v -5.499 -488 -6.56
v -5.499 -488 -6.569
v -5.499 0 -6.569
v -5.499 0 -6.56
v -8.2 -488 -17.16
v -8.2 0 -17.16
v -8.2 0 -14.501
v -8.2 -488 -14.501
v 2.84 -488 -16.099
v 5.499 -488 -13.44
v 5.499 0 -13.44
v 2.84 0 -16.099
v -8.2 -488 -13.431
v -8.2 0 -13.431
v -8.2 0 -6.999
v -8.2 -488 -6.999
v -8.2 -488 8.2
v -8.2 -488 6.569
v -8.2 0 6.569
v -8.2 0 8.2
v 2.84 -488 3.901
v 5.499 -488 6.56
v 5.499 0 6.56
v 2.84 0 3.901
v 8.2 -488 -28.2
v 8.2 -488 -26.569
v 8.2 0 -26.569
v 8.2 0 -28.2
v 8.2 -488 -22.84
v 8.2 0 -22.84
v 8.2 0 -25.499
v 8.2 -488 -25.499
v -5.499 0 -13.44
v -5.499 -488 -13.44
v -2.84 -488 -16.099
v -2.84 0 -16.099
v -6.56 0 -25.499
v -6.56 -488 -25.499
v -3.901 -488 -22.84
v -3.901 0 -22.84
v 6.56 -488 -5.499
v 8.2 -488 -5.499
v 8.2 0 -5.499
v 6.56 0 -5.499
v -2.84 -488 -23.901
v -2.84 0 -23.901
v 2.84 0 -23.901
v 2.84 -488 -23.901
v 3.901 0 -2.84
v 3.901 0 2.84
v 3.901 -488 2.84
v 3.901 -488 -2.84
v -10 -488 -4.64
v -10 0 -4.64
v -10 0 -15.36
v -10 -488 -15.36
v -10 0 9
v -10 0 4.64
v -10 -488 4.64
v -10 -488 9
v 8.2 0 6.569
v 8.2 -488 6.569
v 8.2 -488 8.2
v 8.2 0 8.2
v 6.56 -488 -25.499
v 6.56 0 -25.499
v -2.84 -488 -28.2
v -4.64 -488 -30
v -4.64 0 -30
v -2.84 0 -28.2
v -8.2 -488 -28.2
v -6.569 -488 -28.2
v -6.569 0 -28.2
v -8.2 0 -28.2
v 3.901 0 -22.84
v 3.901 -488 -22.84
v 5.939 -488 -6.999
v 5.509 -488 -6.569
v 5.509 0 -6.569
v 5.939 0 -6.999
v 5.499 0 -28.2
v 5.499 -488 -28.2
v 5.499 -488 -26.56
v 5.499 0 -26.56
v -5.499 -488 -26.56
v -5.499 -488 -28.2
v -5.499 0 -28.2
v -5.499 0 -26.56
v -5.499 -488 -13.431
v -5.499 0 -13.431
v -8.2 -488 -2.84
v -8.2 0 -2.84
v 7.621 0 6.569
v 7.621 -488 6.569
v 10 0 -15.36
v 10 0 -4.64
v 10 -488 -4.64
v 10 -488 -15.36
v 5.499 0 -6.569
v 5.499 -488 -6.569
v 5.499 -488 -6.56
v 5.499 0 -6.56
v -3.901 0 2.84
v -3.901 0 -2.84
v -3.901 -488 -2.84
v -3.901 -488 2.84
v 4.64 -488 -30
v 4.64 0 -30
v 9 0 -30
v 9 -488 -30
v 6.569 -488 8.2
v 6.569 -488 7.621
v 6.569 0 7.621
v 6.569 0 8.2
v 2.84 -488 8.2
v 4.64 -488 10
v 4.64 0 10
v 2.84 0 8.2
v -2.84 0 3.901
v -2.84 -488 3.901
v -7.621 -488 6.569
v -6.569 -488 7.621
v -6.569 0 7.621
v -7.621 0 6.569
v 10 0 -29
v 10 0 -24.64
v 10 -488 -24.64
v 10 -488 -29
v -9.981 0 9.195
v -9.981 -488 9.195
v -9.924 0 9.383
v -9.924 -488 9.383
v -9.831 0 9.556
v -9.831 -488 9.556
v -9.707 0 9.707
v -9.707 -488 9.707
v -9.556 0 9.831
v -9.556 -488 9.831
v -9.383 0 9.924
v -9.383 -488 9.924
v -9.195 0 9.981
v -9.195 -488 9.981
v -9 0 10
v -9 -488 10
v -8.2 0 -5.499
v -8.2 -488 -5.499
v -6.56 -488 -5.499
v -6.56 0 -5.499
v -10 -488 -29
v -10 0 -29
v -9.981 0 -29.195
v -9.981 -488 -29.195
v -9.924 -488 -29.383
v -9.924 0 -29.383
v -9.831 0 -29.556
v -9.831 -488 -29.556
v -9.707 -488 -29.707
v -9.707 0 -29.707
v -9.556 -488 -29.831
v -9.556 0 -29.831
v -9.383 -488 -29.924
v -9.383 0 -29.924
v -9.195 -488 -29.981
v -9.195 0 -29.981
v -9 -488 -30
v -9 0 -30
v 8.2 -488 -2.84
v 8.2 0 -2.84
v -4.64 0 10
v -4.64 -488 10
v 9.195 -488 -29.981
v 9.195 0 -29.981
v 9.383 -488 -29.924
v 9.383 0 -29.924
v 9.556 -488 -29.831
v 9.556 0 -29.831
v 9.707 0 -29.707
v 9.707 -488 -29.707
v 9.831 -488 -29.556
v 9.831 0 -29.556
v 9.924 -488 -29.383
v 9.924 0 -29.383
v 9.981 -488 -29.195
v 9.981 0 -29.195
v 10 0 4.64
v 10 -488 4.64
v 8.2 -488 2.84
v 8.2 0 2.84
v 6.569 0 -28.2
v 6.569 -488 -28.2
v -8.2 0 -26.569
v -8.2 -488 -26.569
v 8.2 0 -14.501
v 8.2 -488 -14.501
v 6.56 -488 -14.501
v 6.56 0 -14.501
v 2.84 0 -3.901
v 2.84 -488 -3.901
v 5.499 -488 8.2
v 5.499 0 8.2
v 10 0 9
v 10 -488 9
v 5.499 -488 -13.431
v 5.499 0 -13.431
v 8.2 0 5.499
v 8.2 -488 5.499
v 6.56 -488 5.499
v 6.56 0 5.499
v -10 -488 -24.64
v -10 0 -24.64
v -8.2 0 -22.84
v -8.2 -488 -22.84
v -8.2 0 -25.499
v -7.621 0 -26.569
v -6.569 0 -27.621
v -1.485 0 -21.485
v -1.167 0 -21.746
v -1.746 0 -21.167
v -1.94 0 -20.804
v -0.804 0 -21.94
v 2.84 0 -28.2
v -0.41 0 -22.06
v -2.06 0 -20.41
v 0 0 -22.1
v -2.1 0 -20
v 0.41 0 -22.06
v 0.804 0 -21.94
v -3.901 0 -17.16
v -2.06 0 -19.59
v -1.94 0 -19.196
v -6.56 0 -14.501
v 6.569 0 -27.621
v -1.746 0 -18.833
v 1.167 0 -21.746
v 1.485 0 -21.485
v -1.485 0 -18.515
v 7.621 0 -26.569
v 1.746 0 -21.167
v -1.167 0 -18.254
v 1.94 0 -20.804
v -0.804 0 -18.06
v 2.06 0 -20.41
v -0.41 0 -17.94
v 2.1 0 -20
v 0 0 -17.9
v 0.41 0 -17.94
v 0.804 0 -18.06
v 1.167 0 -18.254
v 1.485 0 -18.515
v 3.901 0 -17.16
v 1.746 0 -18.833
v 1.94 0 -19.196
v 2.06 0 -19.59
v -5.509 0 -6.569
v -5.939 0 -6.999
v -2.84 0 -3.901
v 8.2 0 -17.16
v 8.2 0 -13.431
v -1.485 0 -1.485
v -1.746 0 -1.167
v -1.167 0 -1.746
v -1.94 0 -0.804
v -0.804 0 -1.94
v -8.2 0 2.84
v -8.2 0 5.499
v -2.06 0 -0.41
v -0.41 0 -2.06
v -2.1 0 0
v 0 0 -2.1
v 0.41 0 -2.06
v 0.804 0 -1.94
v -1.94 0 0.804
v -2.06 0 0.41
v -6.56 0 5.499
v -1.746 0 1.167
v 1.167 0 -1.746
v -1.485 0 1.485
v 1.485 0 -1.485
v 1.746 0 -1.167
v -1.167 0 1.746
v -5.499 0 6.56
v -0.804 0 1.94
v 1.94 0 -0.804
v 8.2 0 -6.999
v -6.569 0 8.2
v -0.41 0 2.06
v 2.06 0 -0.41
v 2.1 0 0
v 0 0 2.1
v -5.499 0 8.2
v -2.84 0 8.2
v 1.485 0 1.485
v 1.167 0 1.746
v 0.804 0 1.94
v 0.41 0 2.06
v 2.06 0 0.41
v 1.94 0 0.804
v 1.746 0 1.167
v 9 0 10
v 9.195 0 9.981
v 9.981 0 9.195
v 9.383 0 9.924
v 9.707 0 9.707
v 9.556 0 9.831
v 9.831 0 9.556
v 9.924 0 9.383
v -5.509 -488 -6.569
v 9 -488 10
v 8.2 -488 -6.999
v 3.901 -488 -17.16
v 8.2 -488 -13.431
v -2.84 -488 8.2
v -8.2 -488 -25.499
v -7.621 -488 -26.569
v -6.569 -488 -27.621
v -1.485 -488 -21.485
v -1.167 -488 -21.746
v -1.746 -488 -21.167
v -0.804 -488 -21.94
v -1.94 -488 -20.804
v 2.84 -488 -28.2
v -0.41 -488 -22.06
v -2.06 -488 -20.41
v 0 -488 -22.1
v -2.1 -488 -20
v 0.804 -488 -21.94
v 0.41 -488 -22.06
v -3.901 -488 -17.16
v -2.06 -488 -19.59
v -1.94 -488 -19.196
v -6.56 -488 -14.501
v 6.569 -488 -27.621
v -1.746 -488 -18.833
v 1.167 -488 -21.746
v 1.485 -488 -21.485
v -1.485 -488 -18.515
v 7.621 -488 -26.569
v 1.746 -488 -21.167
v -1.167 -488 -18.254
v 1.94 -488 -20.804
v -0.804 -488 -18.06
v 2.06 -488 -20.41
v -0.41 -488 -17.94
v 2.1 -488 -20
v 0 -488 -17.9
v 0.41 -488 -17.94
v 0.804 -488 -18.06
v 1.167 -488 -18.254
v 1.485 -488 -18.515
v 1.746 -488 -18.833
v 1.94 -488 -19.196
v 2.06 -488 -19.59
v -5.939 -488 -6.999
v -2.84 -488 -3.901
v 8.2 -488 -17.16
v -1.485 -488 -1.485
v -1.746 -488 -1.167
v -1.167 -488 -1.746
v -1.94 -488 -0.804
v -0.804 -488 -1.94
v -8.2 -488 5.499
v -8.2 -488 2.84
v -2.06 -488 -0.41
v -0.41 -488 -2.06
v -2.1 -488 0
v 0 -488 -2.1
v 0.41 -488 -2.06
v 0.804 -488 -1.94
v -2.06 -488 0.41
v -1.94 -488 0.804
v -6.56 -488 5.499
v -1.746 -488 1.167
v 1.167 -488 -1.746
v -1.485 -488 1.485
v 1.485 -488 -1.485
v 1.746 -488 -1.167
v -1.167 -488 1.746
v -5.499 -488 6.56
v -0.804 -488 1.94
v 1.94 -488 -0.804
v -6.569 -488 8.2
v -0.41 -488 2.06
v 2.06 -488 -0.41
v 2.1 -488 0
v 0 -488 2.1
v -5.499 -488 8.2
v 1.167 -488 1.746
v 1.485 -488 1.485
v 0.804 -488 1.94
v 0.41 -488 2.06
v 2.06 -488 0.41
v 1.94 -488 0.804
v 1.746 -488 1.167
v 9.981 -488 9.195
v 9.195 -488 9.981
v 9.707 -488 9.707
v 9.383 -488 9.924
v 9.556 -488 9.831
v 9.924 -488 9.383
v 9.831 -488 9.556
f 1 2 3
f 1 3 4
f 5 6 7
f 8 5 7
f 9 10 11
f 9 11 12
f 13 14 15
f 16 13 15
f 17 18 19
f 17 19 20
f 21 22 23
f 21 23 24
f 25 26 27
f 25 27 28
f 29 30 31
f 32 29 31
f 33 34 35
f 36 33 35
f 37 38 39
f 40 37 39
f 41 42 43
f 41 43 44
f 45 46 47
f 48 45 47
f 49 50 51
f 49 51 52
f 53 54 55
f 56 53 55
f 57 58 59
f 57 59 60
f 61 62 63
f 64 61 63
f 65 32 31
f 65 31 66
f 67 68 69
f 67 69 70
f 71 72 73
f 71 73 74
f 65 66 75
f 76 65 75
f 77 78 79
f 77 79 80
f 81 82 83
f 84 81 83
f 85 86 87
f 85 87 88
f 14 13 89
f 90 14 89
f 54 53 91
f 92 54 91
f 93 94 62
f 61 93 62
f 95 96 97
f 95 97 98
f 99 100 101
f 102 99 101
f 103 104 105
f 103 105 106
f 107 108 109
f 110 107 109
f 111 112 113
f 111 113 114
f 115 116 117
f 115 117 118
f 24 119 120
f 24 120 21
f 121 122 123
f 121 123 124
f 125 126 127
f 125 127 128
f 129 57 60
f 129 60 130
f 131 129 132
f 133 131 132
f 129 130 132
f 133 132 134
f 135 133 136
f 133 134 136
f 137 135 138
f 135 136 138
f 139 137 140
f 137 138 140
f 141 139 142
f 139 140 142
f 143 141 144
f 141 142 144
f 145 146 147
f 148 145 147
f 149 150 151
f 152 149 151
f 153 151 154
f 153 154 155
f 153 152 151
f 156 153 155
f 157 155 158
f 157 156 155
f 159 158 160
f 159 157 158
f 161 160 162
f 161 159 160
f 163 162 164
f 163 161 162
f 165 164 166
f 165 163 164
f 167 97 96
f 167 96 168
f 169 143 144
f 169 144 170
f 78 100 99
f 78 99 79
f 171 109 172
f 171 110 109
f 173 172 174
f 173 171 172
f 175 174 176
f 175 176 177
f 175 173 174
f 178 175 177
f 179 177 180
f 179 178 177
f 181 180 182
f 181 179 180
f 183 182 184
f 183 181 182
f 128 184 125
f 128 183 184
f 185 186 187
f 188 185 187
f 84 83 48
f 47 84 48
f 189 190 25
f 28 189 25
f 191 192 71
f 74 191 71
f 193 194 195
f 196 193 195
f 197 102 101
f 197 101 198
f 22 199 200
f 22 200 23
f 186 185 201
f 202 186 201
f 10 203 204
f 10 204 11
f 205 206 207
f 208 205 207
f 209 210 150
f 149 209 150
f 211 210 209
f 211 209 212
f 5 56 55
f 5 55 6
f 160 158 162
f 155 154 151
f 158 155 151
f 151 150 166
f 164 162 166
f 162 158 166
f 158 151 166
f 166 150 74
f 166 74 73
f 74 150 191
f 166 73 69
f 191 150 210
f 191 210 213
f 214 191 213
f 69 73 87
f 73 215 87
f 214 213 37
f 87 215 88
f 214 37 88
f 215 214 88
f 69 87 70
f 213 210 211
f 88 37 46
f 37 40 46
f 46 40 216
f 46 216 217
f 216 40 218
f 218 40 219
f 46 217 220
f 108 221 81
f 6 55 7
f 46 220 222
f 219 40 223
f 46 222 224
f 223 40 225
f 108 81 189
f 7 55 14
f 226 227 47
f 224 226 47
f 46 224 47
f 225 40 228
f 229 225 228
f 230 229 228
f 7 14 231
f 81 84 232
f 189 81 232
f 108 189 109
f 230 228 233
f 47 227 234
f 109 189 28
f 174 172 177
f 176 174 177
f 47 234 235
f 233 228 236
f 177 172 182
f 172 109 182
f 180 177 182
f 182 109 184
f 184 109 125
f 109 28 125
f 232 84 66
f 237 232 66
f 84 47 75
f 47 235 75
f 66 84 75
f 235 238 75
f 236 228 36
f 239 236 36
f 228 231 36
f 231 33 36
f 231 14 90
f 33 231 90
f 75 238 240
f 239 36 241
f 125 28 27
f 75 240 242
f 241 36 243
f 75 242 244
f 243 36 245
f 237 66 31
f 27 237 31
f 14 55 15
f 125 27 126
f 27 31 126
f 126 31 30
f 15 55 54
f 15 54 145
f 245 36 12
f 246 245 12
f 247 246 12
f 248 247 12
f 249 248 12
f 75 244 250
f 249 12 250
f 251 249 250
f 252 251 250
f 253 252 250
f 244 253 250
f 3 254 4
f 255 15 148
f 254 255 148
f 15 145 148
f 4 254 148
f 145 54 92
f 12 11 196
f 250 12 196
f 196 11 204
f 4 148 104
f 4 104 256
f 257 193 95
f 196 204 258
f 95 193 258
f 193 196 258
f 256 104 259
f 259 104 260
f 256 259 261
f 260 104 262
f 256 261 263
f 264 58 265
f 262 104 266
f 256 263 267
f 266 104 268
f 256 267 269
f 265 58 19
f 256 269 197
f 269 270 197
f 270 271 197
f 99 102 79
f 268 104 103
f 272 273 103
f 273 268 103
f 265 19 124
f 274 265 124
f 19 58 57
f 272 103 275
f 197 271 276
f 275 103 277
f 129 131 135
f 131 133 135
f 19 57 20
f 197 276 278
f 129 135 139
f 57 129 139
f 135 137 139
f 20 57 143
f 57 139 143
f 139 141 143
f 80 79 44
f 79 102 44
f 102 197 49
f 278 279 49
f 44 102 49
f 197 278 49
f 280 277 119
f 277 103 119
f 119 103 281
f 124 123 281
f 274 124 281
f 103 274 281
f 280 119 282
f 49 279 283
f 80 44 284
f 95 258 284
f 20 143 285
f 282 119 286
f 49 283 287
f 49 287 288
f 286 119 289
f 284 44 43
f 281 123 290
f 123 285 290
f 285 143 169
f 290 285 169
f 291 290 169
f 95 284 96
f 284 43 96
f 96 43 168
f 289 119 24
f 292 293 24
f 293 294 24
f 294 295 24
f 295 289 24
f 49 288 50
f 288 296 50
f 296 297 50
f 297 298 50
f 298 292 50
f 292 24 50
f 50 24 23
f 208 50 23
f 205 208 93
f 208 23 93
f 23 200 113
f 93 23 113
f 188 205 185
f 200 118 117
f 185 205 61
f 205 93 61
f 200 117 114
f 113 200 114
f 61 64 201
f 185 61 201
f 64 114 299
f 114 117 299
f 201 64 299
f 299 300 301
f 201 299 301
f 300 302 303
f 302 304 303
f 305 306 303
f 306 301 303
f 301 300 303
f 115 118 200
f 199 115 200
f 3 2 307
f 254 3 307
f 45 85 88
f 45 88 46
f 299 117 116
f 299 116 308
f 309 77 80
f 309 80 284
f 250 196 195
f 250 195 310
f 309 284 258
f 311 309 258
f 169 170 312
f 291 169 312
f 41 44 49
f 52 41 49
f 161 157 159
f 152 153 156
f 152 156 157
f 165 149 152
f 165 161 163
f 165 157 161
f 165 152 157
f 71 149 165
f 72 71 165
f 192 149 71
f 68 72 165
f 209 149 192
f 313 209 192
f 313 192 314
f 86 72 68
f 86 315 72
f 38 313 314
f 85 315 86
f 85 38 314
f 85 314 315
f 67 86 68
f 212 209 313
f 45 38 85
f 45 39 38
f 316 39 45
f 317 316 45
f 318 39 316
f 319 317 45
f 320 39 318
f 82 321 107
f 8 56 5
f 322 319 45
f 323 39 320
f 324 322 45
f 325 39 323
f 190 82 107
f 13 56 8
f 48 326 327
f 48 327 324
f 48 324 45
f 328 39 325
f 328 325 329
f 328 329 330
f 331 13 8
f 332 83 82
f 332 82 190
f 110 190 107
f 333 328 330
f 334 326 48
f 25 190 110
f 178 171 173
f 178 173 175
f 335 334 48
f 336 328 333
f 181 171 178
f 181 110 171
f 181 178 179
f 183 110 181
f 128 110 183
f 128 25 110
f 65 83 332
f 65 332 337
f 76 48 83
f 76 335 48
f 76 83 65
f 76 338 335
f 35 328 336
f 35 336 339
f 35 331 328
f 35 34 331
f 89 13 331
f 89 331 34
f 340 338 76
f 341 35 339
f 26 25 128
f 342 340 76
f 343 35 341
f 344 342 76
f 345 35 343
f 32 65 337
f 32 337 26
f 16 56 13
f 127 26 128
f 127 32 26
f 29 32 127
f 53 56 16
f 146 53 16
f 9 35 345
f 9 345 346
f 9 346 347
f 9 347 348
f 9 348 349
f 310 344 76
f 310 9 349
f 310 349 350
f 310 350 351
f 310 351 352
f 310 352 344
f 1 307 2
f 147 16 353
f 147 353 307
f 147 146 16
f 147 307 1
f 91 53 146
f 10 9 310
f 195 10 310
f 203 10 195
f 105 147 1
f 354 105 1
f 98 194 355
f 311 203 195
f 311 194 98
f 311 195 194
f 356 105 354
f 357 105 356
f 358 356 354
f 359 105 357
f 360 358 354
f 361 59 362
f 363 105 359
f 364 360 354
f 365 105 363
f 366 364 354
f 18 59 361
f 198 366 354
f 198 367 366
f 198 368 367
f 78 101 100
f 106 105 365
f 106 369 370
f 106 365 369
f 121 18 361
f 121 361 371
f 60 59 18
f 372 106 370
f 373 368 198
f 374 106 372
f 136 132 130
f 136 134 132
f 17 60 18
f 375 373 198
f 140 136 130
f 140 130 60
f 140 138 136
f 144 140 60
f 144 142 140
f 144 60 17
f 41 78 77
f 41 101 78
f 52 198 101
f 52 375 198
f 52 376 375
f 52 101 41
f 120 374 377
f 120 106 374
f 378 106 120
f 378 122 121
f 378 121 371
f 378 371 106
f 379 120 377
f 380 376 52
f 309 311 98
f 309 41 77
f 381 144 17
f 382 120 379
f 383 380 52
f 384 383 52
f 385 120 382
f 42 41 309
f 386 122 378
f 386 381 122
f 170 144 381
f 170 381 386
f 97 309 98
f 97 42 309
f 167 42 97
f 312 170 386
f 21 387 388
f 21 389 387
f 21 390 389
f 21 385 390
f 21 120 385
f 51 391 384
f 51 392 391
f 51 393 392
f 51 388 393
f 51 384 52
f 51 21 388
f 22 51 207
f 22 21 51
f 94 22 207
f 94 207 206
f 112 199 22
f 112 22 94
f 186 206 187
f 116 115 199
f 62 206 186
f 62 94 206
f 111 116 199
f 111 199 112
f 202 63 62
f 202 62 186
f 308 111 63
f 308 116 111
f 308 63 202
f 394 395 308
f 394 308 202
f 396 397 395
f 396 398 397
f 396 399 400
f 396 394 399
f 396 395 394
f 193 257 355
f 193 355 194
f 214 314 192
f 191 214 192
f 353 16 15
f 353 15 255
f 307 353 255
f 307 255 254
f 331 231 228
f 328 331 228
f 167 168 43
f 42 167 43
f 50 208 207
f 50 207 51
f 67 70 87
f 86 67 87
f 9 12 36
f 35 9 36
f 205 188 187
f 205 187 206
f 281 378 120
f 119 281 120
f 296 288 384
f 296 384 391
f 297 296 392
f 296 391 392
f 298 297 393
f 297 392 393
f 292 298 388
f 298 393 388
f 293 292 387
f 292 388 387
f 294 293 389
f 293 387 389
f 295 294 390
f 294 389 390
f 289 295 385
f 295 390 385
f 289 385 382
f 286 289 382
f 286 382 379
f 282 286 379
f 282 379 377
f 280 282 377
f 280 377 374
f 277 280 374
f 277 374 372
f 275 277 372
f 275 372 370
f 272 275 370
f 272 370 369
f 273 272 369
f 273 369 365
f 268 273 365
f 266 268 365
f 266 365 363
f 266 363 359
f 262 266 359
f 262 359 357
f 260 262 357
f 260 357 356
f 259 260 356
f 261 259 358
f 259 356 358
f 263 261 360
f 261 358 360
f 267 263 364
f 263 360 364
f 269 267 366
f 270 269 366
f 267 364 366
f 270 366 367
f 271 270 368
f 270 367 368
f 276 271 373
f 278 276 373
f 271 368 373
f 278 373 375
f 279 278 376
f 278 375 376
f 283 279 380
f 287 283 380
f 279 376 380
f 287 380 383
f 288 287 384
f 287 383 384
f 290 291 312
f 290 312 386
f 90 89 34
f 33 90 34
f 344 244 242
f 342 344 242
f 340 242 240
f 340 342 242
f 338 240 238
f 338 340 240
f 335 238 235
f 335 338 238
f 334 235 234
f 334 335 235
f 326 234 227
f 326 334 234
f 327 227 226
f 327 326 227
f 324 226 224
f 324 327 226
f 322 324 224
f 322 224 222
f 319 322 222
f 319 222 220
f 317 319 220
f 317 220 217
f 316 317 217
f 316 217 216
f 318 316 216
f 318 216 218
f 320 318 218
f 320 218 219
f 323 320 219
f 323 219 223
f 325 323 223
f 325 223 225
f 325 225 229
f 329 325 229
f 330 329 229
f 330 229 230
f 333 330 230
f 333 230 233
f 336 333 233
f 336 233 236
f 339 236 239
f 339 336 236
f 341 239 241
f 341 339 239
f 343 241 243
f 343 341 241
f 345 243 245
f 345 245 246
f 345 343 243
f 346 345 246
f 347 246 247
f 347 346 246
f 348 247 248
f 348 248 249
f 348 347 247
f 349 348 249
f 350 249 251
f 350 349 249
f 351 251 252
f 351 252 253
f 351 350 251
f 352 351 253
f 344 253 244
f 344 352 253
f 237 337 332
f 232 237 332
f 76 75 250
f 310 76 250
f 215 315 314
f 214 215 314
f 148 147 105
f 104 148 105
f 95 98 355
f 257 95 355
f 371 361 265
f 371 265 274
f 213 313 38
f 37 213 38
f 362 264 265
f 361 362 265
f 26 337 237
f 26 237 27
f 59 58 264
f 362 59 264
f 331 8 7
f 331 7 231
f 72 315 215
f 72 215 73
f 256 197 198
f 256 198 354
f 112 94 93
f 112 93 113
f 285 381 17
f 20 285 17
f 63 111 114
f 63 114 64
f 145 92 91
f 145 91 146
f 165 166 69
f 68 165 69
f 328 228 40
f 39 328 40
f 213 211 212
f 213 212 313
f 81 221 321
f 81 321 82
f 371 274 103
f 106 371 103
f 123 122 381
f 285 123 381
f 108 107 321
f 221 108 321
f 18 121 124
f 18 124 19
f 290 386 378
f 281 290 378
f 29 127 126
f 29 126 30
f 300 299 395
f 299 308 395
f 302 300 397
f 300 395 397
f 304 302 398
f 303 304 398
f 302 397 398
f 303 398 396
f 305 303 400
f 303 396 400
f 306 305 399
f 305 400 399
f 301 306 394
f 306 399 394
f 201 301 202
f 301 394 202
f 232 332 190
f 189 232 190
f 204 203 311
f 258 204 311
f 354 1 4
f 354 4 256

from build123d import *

# Parameters (mm, degrees)
F0_W             = 20
F0_H             = 20
F1_DEPTH         = 488
F2_R             = 2.1
F3_DEPTH         = 488.001
F4_R             = 1
F6_DEPTH         = 488.001
F6_COPIES3_COUNT = 2
F6_COPIES3_ANGLE = 90
F6_COPIES4_COUNT = 2
F6_COPIES4_ANGLE = 270
F6_COPIES6_COUNT = 2
F9_W             = 16.4
F9_H             = 6.8613203436
F10_DEPTH        = 488.001
F12_DEPTH        = 488


# Not quite as in the source:
# - a pattern or mirror of a feature is missing from the dataset's text; its kind, count and spacing are read off the source's solid


with BuildPart() as f1:
    # F0 (on Front) → F1 (new body)
    with BuildSketch(Plane.XZ):
        Rectangle(F0_W, F0_H)
    extrude(amount=F1_DEPTH)

    # F2 (on face) → F3 (cut, through all)
    with BuildSketch(Plane.XZ.offset(488)):
        Circle(F2_R)
    extrude(amount=-F3_DEPTH, mode=Mode.SUBTRACT)

    # F4
    f4_edges = [f1.edges().sort_by_distance(p)[0] for p in [
        (-10, -244, 10),
        (10, -244, 10),
    ]]
    fillet(f4_edges, radius=F4_R)

    # F5 (on face) → F6 (cut, through all)
    with BuildSketch(Plane.XZ.offset(488)):
        Polygon((0, 3.9006601718), (0, 10), (-2.84, 10), (-4.64, 10), (-2.84, 8.2), (-5.4993398282, 8.2), (-5.4993398282, 6.56), (-2.84, 3.9006601718), align=None)
        Polygon((-6.5693398282, 8.2), (-8.2, 8.2), (-7.0953059148, 7.0953059148), (-6.5693398282, 7.6212720014), align=None)
    f6 = extrude(amount=-F6_DEPTH, mode=Mode.SUBTRACT)

    # F6_copies: F6 across plane
    add(f6.mirror(Plane(origin=(0, 0, 0), x_dir=(-0.7071067812, 0, -0.7071067812), z_dir=(0.7071067812, 0, -0.7071067812))), mode=Mode.SUBTRACT)

    # F6_copies1: F6 across plane
    add(f6.mirror(Plane(origin=(0, 0, 0), x_dir=(0.7071067812, 0, -0.7071067812), z_dir=(-0.7071067812, 0, -0.7071067812))), mode=Mode.SUBTRACT)

    # F6_copies2: F6 across plane
    add(f6.mirror(Plane(origin=(0, 0, 0), x_dir=(0, 0, 1), z_dir=(1, 0, 0))), mode=Mode.SUBTRACT)

    # F6_copies3: F6 ×2 about axis
    f6_copies3_axis = Axis((0, 0, 0), (0, 1, 0))
    for i in range(1, F6_COPIES3_COUNT):
        add(f6.rotate(f6_copies3_axis, i * F6_COPIES3_ANGLE / (F6_COPIES3_COUNT - 1)), mode=Mode.SUBTRACT)

    # F6_copies4: F6 ×2 about axis
    f6_copies4_axis = Axis((0, 0, 0), (0, 1, 0))
    for i in range(1, F6_COPIES4_COUNT):
        add(f6.rotate(f6_copies4_axis, i * F6_COPIES4_ANGLE / (F6_COPIES4_COUNT - 1)), mode=Mode.SUBTRACT)

    # F6_copies5: F6 across plane
    add(f6.mirror(Plane(origin=(0, 0, 0), x_dir=(-1, 0, 0), z_dir=(0, 0, -1))), mode=Mode.SUBTRACT)

    # F6_copies6: F6 ×2 about axis
    f6_copies6_axis = Axis((0, 0, 0), (0, 1, 0))
    for i in range(1, F6_COPIES6_COUNT):
        add(f6.rotate(f6_copies6_axis, i * 360 / F6_COPIES6_COUNT), mode=Mode.SUBTRACT)

    # F8: F1 across face


with BuildPart() as f1_1:
    add(f1.part)
    add(f1.part.mirror(Plane(origin=(-7.32, -244, -10), x_dir=(1, 0, 0), z_dir=(0, 0, -1))))

    # F9 (on face) → F10 (cut, through all)
    with BuildSketch(Plane.XZ.offset(488)):
        with Locations((0, -10)):
            Rectangle(F9_W, F9_H)
    extrude(amount=-F10_DEPTH, mode=Mode.SUBTRACT)

    # F11 (on face) → F12 (join, through all)
    with BuildSketch(Plane.XZ.offset(488)):
        with BuildLine():
            ThreePointArc((-9, -10), (-9.7071067812, -9.7071067812), (-10, -9))
            Line((-10, -9), (-10, -11))
            ThreePointArc((-10, -11), (-9.7071067812, -10.2928932188), (-9, -10))
        make_face()
        with BuildLine():
            ThreePointArc((10, -9), (9.7071067812, -9.7071067812), (9, -10))
            ThreePointArc((9, -10), (9.7071067812, -10.2928932188), (10, -11))
            Line((10, -11), (10, -9))
        make_face()
        Polygon((5.9386796564, -6.9993398282), (8.2, -6.9993398282), (8.2, -6.5693398282), (5.5086796564, -6.5693398282), align=None)
        Polygon((-8.2, -6.5693398282), (-8.2, -6.9993398282), (-5.9386796564, -6.9993398282), (-5.5086796564, -6.5693398282), align=None)
    extrude(amount=-F12_DEPTH)


solid = f1_1.part
